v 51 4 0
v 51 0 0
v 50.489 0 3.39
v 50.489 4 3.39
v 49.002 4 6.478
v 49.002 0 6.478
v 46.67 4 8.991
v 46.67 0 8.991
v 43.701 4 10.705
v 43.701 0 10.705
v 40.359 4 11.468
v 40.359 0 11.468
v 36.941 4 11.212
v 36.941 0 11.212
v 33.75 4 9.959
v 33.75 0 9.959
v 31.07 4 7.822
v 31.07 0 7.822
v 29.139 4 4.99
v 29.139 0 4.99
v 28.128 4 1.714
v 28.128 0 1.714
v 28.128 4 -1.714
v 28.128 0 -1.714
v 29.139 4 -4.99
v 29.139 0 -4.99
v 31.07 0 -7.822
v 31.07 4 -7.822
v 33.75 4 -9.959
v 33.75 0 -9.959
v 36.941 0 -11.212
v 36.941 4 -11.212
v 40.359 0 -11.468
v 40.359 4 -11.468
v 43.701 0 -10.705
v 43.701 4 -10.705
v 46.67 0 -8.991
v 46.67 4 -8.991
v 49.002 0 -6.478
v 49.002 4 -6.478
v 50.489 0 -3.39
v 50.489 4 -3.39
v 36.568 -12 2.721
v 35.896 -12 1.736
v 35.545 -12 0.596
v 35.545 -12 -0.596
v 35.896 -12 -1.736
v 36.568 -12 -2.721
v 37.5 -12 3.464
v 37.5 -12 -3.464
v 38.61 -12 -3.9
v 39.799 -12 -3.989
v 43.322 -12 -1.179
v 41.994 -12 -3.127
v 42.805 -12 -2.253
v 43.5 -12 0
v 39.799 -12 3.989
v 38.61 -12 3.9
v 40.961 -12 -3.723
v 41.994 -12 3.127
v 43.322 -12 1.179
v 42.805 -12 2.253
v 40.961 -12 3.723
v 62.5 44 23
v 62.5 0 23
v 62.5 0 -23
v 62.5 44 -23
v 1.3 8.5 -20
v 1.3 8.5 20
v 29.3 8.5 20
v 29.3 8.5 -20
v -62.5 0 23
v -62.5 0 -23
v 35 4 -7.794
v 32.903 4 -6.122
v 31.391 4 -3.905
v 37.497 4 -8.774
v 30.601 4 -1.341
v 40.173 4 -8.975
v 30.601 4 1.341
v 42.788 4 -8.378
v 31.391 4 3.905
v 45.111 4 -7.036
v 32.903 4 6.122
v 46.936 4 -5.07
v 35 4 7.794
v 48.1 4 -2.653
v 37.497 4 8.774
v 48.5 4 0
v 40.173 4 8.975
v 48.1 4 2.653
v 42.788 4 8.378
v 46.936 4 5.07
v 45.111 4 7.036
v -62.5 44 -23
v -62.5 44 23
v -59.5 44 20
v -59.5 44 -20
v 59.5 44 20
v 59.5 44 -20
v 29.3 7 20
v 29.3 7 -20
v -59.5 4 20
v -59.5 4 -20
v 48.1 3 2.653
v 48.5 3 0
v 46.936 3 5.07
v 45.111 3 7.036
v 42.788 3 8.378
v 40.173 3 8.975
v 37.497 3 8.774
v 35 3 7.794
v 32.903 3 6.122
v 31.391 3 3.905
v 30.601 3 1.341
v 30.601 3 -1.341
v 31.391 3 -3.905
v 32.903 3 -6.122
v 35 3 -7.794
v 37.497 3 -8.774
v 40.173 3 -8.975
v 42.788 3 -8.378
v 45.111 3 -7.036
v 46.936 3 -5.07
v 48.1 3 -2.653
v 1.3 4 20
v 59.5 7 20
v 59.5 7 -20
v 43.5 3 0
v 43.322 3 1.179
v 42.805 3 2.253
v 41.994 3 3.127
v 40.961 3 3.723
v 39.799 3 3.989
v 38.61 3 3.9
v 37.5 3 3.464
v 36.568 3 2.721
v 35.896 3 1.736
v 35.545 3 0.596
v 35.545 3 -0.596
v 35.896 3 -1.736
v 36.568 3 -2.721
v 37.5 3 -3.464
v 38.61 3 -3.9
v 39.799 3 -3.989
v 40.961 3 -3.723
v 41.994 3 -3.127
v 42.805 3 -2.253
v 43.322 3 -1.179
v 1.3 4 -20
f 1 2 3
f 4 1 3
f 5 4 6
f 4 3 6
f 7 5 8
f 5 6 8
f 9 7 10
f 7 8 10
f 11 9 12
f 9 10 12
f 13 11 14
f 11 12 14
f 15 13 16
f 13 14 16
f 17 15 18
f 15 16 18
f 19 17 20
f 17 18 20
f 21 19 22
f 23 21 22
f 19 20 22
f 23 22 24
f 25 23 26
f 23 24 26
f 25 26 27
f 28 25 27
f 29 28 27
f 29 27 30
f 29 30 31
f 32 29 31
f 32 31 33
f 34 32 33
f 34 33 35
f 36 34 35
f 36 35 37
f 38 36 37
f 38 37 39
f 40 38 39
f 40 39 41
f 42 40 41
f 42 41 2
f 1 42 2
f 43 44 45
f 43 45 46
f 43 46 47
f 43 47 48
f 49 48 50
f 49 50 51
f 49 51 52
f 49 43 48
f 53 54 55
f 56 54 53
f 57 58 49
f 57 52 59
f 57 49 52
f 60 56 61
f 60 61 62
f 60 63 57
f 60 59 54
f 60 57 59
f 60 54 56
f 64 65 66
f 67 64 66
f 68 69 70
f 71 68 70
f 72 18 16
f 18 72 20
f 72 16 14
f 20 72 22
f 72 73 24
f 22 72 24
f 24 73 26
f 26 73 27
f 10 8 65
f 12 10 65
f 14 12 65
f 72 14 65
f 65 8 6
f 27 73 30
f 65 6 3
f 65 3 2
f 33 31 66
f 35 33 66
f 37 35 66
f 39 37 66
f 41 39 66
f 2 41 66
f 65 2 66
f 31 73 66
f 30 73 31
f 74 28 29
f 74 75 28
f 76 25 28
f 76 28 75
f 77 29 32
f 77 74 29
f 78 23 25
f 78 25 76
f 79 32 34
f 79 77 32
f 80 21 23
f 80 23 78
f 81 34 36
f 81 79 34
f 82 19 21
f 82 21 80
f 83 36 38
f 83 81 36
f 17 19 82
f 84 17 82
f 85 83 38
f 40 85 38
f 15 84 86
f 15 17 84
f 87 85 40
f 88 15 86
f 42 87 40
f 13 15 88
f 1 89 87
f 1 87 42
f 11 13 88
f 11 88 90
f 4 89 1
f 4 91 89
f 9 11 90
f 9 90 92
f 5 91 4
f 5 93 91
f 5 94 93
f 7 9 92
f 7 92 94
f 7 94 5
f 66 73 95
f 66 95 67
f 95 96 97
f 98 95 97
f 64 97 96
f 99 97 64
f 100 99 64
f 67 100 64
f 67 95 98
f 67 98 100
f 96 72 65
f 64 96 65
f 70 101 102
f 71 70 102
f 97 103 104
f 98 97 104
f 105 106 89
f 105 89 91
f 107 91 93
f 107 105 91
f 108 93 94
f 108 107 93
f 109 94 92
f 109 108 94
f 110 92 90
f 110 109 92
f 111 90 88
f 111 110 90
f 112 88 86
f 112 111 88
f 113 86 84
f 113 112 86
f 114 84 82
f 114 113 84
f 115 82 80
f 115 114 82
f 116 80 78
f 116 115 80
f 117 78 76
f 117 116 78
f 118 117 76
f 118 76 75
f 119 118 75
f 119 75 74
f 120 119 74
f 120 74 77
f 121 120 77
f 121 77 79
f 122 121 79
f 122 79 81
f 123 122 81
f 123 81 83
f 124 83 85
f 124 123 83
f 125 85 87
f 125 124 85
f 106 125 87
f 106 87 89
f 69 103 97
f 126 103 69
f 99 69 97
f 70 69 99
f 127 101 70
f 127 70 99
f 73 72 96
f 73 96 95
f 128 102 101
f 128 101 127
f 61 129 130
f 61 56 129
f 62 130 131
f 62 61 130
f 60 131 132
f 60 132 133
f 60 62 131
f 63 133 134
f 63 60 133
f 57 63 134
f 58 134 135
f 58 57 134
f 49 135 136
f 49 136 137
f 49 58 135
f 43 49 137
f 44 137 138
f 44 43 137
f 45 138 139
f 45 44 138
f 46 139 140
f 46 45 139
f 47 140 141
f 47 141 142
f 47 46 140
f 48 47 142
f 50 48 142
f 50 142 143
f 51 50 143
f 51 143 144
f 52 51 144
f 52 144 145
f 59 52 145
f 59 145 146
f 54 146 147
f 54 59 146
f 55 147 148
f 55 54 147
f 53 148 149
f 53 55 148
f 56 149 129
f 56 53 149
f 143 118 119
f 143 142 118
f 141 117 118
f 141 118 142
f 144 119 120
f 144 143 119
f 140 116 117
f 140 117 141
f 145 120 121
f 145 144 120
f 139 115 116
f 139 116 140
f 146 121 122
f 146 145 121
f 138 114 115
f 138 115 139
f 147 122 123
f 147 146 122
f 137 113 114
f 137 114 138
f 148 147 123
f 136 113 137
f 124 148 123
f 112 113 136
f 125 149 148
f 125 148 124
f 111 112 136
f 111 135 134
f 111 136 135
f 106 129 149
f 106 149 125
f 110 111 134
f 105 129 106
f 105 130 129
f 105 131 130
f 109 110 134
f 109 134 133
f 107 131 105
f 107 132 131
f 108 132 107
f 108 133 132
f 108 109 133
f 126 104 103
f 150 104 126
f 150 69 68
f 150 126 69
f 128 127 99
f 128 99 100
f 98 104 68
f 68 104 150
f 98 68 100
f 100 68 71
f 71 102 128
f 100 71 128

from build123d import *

# Parameters (mm, degrees)
SKETCH1_W           = 119
SKETCH1_H           = 40
BOSS_EXTRUDE1_DEPTH = 4
SKETCH2_W           = 125
SKETCH2_H           = 46
SKETCH2_W_2         = 119
SKETCH2_H_2         = 40
BOSS_EXTRUDE2_DEPTH = 44
SKETCH3_W           = 58.2
SKETCH3_H           = 40
BOSS_EXTRUDE3_DEPTH = 3
SKETCH4_W           = 28
SKETCH4_H           = 40
BOSS_EXTRUDE4_DEPTH = 1.5
SKETCH5_R           = 4
BOSS_EXTRUDE5_DEPTH = 12
SKETCH6_R           = 11.5
SKETCH6_R_2         = 4
CUT_EXTRUDE1_DEPTH  = 3
SKETCH7_R           = 11.5
SKETCH7_R_2         = 9
CUT_EXTRUDE2_DEPTH  = 1


with BuildPart() as part:
    # Sketch1 → Boss-Extrude1 (new body)
    with BuildSketch(Plane(origin=(0, 0, 0), x_dir=(1, 0, 0), z_dir=(0, 1, 0))):
        Rectangle(SKETCH1_W, SKETCH1_H)
    extrude(amount=BOSS_EXTRUDE1_DEPTH)

    # Sketch2 → Boss-Extrude2 (add)
    with BuildSketch(Plane(origin=(0, 0, 0), x_dir=(1, 0, 0), z_dir=(0, 1, 0))):
        Rectangle(SKETCH2_W, SKETCH2_H)
        Rectangle(SKETCH2_W_2, SKETCH2_H_2, mode=Mode.SUBTRACT)
    extrude(amount=BOSS_EXTRUDE2_DEPTH)

    # Sketch3 → Boss-Extrude3 (add)
    with BuildSketch(Plane(origin=(0, 4, 0), x_dir=(1, 0, 0), z_dir=(0, 1, 0))):
        with Locations((30.4, 0)):
            Rectangle(SKETCH3_W, SKETCH3_H)
    extrude(amount=BOSS_EXTRUDE3_DEPTH)

    # Sketch4 → Boss-Extrude4 (add)
    with BuildSketch(Plane(origin=(0, 7, 0), x_dir=(1, 0, 0), z_dir=(0, 1, 0))):
        with Locations((15.3, 0)):
            Rectangle(SKETCH4_W, SKETCH4_H)
    extrude(amount=BOSS_EXTRUDE4_DEPTH)

    # Sketch5 → Boss-Extrude5 (add)
    with BuildSketch(Plane.XZ):
        with Locations((39.5, 0)):
            Circle(SKETCH5_R)
    extrude(amount=BOSS_EXTRUDE5_DEPTH)

    # Sketch6 → Cut-Extrude1 (cut)
    with BuildSketch(Plane.XZ):
        with Locations((39.5, 0)):
            Circle(SKETCH6_R)
        with Locations((39.5, 0)):
            Circle(SKETCH6_R_2, mode=Mode.SUBTRACT)
    extrude(amount=-CUT_EXTRUDE1_DEPTH, mode=Mode.SUBTRACT)

    # Sketch7 → Cut-Extrude2 (cut)
    with BuildSketch(Plane.XZ.offset(-3)):
        with Locations((39.5, 0)):
            Circle(SKETCH7_R)
        with Locations((39.5, 0)):
            Circle(SKETCH7_R_2, mode=Mode.SUBTRACT)
    extrude(amount=-CUT_EXTRUDE2_DEPTH, mode=Mode.SUBTRACT)


solid = part.part
